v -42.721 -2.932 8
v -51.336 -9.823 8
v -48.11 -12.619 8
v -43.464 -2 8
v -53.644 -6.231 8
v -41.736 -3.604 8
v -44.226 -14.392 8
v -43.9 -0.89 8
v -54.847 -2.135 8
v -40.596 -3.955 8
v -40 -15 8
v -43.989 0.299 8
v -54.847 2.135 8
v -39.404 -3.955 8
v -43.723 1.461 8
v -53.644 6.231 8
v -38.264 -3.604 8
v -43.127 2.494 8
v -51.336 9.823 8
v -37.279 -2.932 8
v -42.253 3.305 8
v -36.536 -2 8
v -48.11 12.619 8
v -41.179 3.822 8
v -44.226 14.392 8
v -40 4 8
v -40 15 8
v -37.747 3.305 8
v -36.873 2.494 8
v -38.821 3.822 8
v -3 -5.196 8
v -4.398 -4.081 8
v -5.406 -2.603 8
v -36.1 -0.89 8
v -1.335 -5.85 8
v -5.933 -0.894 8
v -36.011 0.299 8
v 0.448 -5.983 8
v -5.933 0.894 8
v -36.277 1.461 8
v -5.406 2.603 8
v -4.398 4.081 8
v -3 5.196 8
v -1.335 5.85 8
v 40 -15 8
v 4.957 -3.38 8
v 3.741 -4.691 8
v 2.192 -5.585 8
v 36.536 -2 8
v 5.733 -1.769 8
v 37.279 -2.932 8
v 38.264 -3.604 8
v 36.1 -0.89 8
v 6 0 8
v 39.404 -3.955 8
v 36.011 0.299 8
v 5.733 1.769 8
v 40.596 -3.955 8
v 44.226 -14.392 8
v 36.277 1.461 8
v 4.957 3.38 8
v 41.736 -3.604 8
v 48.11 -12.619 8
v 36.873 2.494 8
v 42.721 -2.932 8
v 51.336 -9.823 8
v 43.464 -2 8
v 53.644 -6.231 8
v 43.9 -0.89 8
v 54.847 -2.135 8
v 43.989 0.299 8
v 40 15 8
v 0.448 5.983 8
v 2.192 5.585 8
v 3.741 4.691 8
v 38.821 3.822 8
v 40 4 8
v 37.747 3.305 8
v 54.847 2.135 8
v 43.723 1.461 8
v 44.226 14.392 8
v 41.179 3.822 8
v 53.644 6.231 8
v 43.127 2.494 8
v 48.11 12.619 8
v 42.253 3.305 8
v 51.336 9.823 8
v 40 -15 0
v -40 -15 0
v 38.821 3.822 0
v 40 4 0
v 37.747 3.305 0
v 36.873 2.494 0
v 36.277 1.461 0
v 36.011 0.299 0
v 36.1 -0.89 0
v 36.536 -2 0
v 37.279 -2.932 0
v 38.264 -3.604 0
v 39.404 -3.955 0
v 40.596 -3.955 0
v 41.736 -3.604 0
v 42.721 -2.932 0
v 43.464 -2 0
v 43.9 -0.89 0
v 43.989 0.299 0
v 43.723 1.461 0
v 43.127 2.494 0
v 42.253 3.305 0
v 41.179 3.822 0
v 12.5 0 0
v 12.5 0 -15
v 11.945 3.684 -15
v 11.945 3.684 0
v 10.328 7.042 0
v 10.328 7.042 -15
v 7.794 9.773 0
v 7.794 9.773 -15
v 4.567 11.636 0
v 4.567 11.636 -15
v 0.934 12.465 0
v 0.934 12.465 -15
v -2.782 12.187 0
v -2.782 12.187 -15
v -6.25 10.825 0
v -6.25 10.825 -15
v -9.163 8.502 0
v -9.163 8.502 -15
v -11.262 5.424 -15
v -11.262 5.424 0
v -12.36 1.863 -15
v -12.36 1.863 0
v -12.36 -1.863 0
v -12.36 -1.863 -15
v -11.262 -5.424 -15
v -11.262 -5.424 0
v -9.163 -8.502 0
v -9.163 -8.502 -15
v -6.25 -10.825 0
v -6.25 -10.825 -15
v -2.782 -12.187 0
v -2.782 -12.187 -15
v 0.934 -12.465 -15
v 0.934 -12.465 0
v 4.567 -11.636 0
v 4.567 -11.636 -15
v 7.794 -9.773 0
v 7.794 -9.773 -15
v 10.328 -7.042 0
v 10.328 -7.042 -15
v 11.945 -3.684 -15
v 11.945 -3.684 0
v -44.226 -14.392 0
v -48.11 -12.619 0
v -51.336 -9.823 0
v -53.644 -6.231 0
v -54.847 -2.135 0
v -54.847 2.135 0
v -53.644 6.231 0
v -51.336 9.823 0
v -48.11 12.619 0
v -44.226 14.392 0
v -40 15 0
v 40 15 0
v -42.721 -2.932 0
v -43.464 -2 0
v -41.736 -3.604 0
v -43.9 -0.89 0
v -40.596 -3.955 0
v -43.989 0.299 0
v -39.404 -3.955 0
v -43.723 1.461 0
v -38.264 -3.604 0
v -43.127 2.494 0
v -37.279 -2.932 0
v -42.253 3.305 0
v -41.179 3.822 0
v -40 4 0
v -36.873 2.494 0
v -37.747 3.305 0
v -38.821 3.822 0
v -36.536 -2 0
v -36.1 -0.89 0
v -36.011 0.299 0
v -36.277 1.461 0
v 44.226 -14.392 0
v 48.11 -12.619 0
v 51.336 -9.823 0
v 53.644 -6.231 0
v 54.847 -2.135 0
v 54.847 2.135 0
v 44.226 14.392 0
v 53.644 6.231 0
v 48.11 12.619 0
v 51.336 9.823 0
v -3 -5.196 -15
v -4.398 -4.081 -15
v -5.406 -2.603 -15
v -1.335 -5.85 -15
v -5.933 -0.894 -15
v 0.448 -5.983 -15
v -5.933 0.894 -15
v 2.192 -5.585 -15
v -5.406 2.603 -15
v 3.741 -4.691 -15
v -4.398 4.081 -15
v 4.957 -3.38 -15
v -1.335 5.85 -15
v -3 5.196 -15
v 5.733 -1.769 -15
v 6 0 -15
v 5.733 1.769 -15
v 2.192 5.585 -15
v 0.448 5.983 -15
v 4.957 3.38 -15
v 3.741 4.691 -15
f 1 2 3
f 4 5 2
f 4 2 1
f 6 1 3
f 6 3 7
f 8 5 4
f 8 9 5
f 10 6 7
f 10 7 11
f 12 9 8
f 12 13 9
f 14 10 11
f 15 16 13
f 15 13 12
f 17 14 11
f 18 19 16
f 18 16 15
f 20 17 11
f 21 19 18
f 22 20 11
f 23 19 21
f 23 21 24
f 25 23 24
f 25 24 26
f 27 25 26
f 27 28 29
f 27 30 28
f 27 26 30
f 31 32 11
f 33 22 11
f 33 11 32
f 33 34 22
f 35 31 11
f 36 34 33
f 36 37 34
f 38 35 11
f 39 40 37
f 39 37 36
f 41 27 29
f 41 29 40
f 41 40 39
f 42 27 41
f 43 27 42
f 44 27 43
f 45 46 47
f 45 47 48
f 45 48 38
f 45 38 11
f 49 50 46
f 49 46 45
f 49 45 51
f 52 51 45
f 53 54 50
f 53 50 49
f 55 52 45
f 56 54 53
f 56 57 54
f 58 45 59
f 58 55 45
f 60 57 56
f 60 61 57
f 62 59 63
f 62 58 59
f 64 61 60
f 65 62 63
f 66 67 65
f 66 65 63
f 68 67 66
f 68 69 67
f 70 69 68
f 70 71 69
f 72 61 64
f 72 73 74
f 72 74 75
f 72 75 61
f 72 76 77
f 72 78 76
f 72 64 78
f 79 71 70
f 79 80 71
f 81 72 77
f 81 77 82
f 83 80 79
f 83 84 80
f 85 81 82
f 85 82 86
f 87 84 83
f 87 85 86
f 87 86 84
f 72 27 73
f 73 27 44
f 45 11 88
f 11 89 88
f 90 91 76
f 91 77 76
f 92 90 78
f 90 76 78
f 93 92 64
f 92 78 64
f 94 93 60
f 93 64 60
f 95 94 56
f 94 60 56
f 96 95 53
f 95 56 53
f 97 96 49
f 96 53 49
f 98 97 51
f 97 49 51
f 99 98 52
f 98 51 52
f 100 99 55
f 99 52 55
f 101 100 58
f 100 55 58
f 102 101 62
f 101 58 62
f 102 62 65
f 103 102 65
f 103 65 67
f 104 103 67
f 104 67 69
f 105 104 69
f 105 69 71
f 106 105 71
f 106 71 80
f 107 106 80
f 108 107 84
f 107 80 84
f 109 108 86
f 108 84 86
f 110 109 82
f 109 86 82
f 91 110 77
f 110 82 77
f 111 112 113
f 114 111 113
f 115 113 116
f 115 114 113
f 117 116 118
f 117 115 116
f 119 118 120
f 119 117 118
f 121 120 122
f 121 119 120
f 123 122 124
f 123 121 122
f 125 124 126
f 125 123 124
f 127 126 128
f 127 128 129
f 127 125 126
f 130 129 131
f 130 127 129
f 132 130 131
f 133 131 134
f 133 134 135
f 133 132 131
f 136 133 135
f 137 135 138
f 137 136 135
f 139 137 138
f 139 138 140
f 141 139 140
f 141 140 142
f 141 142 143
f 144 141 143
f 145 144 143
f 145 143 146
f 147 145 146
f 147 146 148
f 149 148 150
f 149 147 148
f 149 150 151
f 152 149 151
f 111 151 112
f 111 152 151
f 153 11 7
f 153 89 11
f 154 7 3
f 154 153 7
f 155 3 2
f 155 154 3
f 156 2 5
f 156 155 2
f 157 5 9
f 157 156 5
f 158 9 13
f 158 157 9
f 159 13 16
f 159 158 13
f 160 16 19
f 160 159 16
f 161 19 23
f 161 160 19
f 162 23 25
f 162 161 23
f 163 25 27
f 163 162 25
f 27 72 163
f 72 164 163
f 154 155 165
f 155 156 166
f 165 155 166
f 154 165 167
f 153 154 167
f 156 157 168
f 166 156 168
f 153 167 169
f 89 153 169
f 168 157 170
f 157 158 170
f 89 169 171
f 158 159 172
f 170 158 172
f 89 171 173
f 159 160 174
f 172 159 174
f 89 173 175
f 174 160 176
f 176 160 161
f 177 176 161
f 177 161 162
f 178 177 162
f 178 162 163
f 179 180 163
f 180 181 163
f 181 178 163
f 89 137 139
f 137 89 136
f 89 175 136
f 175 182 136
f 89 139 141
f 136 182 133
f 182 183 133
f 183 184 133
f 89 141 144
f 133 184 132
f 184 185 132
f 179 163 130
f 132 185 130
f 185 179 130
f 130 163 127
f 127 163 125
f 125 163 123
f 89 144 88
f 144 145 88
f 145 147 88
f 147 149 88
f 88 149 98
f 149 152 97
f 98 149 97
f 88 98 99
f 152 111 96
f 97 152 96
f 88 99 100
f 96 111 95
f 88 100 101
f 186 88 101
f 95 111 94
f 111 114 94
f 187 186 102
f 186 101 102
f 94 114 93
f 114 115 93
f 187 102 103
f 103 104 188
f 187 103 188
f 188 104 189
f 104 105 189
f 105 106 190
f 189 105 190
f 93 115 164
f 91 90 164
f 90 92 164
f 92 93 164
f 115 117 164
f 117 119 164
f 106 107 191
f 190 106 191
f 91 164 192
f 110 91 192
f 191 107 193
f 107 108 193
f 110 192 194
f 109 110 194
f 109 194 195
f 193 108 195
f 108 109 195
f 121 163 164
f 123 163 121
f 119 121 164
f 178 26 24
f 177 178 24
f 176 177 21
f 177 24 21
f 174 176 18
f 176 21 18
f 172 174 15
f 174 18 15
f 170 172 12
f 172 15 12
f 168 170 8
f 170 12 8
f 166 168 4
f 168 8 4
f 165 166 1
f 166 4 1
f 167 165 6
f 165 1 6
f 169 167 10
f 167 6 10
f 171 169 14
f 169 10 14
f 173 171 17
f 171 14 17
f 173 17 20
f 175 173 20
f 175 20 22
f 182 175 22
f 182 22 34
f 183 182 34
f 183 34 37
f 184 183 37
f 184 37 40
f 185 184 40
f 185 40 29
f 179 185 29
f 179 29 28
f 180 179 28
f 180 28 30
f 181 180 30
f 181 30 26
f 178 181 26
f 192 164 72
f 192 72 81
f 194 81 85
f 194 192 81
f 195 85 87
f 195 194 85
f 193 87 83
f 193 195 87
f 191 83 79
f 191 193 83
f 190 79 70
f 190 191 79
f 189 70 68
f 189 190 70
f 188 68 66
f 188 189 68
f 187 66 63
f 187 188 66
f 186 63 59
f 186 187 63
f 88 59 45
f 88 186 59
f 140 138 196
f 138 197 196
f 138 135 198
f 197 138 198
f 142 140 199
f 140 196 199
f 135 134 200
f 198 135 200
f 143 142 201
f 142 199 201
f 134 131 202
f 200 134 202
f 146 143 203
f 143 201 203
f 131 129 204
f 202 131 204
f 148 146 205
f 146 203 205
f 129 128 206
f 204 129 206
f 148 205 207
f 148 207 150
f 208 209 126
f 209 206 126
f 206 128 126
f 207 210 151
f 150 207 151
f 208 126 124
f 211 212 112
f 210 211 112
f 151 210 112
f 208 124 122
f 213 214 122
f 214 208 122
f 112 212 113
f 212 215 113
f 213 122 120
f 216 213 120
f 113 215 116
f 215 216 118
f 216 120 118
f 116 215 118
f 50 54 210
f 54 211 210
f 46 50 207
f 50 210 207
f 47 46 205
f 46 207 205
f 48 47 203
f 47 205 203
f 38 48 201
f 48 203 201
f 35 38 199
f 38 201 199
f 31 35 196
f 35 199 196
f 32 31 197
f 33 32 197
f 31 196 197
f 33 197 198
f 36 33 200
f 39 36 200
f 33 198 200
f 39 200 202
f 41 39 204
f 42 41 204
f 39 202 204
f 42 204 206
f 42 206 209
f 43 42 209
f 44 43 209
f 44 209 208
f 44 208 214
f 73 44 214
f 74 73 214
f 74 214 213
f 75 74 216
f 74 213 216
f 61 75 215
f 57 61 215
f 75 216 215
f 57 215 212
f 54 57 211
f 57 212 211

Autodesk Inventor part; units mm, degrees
ref_plane "YZ Plane" through (0, 0, 0) normal (1, 0, 0) x (0, 1, 0)
ref_plane "XZ Plane" through (0, 0, 0) normal (0, 1, 0) x (-1, 0, 0)
ref_plane "XY Plane" through (0, 0, 0) normal (0, 0, 1) x (1, 0, 0)
sketch "Эскиз1" plane through (0, 0, 0) normal (0, 0, 1) x (1, 0, 0)
  line L0 (-40, 0) -> (40, 0) construction
  line L1 (-40, -15) -> (40, -15)
  line L2 (40, 15) -> (-40, 15)
  arc A0 (-40, 15) -> (-40, -15) centre (-40, 0) ccw
  arc A1 (40, -15) -> (40, 15) centre (40, 0) ccw
  circle A2 centre (0, 0) radius 12.5
  circle A3 centre (-40, 0) radius 5
  circle A4 centre (40, 0) radius 5
  circle A5 centre (0, 0) radius 6
  dimension "d1" = 30
  dimension "d2" = 80
  dimension "d5" = 25
  dimension "d6" = 10
  dimension "d7" = 10
  dimension "d8" = 12
extrude "Выдавливание1" add sketch "Эскиз1" along normal blind 8 contours A0 L2 A1 L1 | A2 | A3 | A4 | A5
hole "Отверстие1" at (40, 0, 0) direction (0, 0, 1) diameter 8 end through all
hole "Отверстие2" at (-40, 0, 0) direction (0, 0, 1) diameter 8 end through all
extrude "Выдавливание2" add sketch "Эскиз1" against normal blind 15 contours A2
extrude "Выдавливание3" cut sketch "Эскиз1" along normal blind 15 contours A5
equation "\"Радиус_гибки\" = Толщина"
equation "\"Ширина_просечки\" = Толщина"
equation "\"Глубина_просечки\" = 0.5 * Толщина"
equation "\"Размер_просечки\" = 4 * Толщина"
equation "\"Мин_остаток\" = 2 * Толщина"
equation "\"Радиус_перехода\" = Радиус_гибки"
equation "\"Радиус_Якоби\" = Толщина"
equation "\"Размер_зазора\" = Толщина"
equation "\"Толщина\" = 0.5"
properties part number "pr3defauldetail" material "Нержавеющая сталь"
